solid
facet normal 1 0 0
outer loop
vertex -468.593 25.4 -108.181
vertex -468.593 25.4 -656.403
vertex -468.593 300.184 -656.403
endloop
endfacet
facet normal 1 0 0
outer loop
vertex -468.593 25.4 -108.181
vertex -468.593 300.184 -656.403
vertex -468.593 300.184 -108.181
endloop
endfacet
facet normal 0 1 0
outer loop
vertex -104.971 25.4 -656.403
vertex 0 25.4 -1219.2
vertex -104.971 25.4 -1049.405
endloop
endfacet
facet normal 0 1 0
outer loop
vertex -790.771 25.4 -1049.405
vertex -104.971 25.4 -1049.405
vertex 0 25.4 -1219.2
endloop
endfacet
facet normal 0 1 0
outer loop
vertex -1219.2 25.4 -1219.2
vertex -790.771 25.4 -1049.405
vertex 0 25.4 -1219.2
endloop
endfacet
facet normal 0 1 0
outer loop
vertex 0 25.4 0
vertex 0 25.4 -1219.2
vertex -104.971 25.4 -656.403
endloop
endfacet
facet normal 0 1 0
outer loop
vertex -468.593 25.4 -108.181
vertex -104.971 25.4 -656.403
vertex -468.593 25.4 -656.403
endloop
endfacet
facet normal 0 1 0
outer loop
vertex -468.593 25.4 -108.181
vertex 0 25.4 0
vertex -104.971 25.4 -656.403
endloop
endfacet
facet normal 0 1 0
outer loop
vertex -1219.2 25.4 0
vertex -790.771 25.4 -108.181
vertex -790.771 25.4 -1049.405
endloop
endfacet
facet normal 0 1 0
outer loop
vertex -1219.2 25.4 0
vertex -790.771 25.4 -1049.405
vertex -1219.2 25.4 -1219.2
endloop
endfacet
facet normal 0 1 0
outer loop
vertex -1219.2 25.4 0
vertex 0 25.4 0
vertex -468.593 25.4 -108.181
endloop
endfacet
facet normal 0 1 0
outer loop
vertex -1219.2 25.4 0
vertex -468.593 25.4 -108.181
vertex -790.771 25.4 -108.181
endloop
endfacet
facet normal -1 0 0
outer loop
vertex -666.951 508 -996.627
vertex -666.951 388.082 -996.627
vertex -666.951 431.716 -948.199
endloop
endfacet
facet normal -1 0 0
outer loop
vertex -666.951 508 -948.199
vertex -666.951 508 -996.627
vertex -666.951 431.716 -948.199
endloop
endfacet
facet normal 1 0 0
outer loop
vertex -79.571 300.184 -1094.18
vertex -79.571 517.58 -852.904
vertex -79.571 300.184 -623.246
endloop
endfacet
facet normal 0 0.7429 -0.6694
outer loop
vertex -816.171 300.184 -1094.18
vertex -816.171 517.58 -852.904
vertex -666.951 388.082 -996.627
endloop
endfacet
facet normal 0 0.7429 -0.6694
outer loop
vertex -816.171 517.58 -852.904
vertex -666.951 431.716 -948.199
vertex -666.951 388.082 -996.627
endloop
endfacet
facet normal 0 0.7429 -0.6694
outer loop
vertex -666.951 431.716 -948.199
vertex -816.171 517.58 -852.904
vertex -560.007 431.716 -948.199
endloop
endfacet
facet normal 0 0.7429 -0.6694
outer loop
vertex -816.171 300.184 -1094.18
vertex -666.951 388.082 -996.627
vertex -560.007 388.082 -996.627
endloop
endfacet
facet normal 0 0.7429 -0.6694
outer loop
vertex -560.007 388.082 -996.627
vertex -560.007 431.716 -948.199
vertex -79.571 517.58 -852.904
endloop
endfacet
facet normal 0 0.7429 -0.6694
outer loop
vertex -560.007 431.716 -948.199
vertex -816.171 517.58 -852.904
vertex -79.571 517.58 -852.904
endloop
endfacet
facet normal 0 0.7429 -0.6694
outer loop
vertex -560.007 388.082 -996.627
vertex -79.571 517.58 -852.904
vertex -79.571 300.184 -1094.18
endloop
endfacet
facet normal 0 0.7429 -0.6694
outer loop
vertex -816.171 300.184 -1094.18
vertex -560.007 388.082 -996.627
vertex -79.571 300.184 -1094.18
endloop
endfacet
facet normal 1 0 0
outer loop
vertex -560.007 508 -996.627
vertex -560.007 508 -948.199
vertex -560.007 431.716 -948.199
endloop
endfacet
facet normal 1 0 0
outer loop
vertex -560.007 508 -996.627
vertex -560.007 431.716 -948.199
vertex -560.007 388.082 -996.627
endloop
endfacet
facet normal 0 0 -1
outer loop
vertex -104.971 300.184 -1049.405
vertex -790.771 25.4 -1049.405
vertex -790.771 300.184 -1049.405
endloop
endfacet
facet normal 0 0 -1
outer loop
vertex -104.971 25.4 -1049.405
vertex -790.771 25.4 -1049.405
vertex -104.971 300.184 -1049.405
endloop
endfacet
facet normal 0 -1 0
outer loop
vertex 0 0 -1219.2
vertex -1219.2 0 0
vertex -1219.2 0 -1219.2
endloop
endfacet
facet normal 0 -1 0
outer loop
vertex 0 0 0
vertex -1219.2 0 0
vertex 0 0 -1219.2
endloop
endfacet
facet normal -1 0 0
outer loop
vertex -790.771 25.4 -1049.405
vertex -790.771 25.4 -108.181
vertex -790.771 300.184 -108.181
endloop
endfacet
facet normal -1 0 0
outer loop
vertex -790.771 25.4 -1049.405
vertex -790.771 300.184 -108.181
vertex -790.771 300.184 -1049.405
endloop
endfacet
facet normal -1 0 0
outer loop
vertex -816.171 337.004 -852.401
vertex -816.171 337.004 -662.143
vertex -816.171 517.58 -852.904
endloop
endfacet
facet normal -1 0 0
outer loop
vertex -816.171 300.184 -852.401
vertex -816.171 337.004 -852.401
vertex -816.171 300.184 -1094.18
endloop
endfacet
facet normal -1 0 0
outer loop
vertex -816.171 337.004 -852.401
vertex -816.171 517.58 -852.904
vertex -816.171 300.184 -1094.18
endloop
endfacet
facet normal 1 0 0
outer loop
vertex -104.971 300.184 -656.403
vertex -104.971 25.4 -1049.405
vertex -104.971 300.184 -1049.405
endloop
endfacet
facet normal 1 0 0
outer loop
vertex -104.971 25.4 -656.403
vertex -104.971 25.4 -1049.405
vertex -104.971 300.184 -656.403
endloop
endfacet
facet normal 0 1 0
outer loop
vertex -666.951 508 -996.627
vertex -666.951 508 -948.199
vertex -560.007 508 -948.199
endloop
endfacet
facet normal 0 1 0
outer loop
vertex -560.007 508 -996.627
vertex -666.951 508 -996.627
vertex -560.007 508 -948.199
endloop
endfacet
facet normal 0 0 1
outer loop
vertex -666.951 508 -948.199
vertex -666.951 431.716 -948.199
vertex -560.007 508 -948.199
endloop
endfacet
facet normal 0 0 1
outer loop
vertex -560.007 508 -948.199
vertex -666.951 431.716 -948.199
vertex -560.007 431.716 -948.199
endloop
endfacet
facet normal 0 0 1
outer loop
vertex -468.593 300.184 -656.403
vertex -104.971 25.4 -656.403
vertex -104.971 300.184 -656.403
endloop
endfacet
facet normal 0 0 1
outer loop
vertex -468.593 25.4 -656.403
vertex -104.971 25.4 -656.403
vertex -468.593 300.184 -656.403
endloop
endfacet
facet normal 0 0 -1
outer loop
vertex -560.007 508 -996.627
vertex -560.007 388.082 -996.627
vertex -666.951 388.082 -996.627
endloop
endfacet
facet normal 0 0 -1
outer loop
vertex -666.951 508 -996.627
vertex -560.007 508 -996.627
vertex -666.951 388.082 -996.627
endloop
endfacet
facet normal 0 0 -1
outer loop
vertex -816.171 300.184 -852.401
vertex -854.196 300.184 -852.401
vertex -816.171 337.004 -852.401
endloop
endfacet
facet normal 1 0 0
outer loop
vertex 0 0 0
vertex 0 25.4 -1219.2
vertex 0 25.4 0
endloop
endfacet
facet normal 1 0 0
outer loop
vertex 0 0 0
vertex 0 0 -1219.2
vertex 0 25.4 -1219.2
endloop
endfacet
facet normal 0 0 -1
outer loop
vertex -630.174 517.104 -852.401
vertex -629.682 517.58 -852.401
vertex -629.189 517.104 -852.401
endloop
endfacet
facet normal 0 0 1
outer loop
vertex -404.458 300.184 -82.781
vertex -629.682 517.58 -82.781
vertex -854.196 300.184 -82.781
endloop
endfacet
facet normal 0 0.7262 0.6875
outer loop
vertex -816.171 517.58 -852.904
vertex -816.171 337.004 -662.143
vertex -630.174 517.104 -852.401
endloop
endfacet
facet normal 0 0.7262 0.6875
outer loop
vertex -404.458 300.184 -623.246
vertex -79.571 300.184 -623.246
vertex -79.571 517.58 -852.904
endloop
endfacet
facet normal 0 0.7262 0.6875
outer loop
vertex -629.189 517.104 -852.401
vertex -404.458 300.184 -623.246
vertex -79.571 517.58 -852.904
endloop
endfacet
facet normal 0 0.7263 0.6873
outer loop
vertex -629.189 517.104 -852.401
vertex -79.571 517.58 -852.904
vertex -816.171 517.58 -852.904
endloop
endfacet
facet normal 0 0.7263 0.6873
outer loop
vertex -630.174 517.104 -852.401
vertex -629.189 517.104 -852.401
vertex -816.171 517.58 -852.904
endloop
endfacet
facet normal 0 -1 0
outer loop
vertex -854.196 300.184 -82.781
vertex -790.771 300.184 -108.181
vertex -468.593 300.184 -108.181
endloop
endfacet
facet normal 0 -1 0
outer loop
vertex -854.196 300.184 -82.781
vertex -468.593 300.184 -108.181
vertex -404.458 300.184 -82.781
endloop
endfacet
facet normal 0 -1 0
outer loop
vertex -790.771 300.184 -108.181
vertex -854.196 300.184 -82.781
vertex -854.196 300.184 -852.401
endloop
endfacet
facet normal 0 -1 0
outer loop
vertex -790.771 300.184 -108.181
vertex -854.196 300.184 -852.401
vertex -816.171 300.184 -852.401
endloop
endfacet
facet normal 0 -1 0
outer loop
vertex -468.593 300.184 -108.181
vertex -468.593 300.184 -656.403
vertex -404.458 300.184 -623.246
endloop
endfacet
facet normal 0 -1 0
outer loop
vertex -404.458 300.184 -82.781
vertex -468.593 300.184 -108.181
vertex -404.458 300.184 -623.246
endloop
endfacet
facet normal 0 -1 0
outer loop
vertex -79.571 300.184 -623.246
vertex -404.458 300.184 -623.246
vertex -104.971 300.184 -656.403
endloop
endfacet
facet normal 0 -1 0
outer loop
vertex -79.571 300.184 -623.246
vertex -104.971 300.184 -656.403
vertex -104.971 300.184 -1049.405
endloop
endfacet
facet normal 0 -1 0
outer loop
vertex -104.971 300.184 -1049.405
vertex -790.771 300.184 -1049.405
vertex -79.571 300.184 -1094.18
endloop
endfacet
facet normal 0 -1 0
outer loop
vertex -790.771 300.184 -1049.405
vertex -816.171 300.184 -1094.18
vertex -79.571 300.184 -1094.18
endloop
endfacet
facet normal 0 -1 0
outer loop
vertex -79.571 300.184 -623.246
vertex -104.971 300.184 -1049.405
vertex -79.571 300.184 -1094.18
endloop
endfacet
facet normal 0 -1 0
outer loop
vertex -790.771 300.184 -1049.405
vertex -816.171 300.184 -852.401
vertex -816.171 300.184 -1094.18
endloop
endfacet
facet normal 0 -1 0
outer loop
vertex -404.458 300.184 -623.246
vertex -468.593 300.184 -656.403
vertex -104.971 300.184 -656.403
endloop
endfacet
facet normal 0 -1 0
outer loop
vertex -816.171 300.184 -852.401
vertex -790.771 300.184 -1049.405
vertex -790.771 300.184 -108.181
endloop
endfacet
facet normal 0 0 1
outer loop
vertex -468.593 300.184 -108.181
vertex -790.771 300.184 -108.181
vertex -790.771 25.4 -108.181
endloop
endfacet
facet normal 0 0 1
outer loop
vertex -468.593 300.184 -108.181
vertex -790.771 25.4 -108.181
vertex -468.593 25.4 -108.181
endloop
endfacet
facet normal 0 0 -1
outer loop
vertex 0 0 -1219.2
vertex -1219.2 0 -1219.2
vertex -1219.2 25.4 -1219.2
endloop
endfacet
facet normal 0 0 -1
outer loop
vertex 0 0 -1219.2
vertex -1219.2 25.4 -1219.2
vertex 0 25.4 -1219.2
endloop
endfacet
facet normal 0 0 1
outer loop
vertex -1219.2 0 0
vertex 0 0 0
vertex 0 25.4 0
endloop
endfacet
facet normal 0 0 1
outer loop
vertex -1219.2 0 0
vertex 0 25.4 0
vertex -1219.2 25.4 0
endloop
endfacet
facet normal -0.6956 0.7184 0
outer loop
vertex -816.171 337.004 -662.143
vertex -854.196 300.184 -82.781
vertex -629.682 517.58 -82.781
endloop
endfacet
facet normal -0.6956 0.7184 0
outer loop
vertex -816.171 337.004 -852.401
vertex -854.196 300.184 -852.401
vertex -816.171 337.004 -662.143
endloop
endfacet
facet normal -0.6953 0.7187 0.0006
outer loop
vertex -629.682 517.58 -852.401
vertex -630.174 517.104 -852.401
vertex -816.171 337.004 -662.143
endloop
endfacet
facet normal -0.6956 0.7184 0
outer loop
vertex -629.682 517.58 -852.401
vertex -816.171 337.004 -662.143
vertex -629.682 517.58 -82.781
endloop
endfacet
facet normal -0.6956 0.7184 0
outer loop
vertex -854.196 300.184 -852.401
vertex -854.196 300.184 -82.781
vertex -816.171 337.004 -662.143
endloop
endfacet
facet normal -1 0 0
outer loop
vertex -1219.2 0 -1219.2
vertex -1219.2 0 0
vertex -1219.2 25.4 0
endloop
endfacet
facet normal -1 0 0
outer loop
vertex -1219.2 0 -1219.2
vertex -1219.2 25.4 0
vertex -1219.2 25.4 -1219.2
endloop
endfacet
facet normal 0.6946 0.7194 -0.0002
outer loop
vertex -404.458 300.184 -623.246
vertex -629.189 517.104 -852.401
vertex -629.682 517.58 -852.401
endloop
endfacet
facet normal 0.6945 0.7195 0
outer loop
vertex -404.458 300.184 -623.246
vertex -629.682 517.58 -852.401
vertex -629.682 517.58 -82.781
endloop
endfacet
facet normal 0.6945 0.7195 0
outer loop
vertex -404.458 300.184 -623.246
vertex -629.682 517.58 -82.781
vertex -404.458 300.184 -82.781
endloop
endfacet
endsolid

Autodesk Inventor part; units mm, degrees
ref_plane "YZ Plane" through (0, 0, 0) normal (1, 0, 0) x (0, 1, 0)
ref_plane "XZ Plane" through (0, 0, 0) normal (0, 1, 0) x (-1, 0, 0)
ref_plane "XY Plane" through (0, 0, 0) normal (0, 0, 1) x (1, 0, 0)
sketch "Sketch1" plane through (0, 0, 0) normal (0, 1, 0) x (-1, 0, 0)
  line L0 (0, 0) -> (1219.2, 0)
  line L1 (1219.2, 0) -> (1219.2, -1219.2)
  line L2 (1219.2, -1219.2) -> (0, -1219.2)
  line L3 (0, -1219.2) -> (0, 0)
  dimension "d0" = 1219.2
  dimension "d1" = 1219.2
extrude "Extrusion1" add sketch "Sketch1" along normal blind 25.4
sketch "Sketch2" plane through (0, 25.4, 0) normal (0, 1, 0) x (1, 0, 0)
  line L0 (-790.7708, 108.1811) -> (-790.7708, 1049.4054)
  line L1 (-790.7708, 1049.4054) -> (-104.9708, 1049.4054)
  line L2 (-104.9708, 1049.4054) -> (-104.9708, 656.4029)
  line L3 (-104.9708, 656.4029) -> (-468.5932, 656.4029)
  line L4 (-468.5932, 656.4029) -> (-468.5932, 108.1811)
  line L5 (-468.5932, 108.1811) -> (-790.7708, 108.1811)
  point P0 (0, 0)
  dimension "d10" = 685.8
extrude "Extrusion2" add sketch "Sketch2" along normal blind 304.8
sketch "Sketch3" plane through (-104.9708, 25.4, -656.4029) normal (1, 0, 0) x (0, 0, -1)
  line L0 (-33.1569, 274.7838) -> (196.5012, 492.1801)
  line L1 (196.5012, 492.1801) -> (437.777, 274.7838)
  line L2 (437.777, 274.7838) -> (-33.1569, 274.7838)
  line L3 (0, 304.8) -> (393.0024, 304.8) projected
  point P0 (-656.4029, -25.4)
extrude "Extrusion3" add sketch "Sketch3" along normal blind 25.4
extrude "Extrusion4" add sketch "Sketch3" against normal blind 711.2
sketch "Sketch4" plane through (-790.7708, 25.4, -108.1811) normal (0, 0, 1) x (1, 0, 0)
  line L0 (-63.4257, 274.7838) -> (161.0888, 492.1801)
  line L1 (161.0888, 492.1801) -> (386.3126, 274.7838)
  line L2 (322.1776, 274.7838) -> (711.2, 274.7838) projected
  line L3 (-63.4257, 274.7838) -> (386.3126, 274.7838)
  line L4 (0, 304.8) -> (322.1776, 304.8) projected
  line L5 (711.2, 492.1801) -> (-25.4, 492.1801) projected
  point P0 (790.7708, -25.4)
extrude "Extrusion5" add sketch "Sketch4" against normal blind 744.22
extrude "Extrusion6" add sketch "Sketch4" along normal blind 25.4
sketch "Sketch5" plane through (0, 0, 0) normal (0, -1, 0) x (1, 0, 0)
  line L0 (-560.0074, -996.6268) -> (-666.9511, -996.6268)
  line L1 (-666.9511, -996.6268) -> (-666.9511, -948.1994)
  line L2 (-666.9511, -948.1994) -> (-560.0074, -948.1994)
  line L3 (-560.0074, -948.1994) -> (-560.0074, -996.6268)
  point P0 (0, 0)
extrude "Extrusion7" add sketch "Sketch5" against normal blind 508
equation "\"d1\" = d0"
properties part number "house_1" material "Wood (Oak)"
